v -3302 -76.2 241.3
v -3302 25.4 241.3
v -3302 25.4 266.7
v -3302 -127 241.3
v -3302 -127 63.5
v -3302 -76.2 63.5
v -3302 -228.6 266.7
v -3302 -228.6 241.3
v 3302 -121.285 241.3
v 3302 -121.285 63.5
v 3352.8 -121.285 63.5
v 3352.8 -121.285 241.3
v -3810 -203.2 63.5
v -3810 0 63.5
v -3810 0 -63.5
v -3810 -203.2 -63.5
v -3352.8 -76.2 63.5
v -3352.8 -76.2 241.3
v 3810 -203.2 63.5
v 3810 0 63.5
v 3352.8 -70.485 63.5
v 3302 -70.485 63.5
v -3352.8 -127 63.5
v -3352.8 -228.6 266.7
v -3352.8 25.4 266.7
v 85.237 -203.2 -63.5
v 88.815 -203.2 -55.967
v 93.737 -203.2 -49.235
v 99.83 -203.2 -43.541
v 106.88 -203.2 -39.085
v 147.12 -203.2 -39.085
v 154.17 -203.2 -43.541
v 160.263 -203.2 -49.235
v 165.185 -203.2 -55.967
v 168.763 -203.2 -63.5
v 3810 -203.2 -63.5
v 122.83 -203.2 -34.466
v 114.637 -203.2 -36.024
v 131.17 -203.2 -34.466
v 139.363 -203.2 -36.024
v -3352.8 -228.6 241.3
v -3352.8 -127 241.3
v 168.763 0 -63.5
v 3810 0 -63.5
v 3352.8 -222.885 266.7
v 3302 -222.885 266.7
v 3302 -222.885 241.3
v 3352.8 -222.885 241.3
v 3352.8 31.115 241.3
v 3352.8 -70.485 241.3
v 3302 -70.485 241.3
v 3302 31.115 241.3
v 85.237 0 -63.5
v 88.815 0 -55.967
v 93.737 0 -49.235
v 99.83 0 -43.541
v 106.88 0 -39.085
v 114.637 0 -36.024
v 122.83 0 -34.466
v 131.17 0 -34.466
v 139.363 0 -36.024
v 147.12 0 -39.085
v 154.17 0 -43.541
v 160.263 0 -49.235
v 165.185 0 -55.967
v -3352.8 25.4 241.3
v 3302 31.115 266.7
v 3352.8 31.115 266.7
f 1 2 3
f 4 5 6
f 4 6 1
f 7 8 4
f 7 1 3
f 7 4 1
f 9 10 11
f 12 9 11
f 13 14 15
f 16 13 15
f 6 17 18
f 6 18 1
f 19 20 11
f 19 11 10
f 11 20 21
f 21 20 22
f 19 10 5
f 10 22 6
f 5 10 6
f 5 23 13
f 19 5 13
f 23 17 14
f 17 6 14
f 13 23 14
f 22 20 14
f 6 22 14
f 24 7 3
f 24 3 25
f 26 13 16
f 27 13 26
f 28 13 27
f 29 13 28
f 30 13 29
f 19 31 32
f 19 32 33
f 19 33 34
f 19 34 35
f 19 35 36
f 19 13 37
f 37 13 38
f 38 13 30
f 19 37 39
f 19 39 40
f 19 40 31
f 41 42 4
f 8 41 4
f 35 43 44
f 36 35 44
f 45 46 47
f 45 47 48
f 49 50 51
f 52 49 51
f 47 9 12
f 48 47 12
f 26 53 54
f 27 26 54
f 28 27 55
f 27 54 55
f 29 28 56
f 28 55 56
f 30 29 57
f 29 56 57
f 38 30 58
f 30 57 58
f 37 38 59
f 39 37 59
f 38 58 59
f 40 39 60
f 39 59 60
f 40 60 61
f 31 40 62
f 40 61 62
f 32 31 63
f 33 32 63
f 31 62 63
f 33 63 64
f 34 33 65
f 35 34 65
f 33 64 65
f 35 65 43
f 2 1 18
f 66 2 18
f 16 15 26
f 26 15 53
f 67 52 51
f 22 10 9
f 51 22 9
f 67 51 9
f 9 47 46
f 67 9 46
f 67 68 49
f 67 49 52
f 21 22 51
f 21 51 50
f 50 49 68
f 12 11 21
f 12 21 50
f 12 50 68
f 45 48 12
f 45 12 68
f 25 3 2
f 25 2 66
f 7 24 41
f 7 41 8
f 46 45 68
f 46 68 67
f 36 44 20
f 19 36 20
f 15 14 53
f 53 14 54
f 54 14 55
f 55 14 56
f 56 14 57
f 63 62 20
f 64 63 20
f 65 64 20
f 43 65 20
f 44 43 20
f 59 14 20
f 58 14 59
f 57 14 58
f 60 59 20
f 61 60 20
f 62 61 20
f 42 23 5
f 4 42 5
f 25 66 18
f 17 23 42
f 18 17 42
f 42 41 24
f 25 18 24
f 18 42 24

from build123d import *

# Parameters (mm, degrees)
F1_DEPTH  = 203.2
F2_W      = 50.8
F2_H      = 50.8
F3_DEPTH  = 203.2
F4_W      = 50.8
F4_H      = 25.4
F5_DEPTH  = 101.6
F6_W      = 50.8
F6_H      = 25.4
F7_DEPTH  = 101.6
F8_W      = 50.8
F8_H      = 25.4
F9_DEPTH  = 101.6
F10_W     = 50.8
F10_H     = 25.4
F11_DEPTH = 101.6


with BuildPart() as f1:
    # F0 (on Front) → F1 (new body)
    with BuildSketch(Plane.XZ):
        with BuildLine():
            Line((3810, -63.5), (3810, 63.5))
            Line((3810, 63.5), (-3810, 63.5))
            Line((-3810, 63.5), (-3810, -63.5))
            Line((-3810, -63.5), (85.237012, -63.5))
            ThreePointArc((85.237012, -63.5), (127, -34.270229), (168.762988, -63.5))
            Line((168.762988, -63.5), (420.722027, -63.5))
            Line((420.722027, -63.5), (493.677973, -63.5))
            Line((493.677973, -63.5), (3810, -63.5))
        make_face()
    extrude(amount=F1_DEPTH)

    # F2 (on face) → F3 (join)
    with BuildSketch(Plane.XY.offset(63.5)):
        with Locations((3327.4, -95.884992)):
            Rectangle(F2_W, F2_H)
        with Locations((-3327.4, -101.6)):
            Rectangle(F2_W, F2_H)
    extrude(amount=F3_DEPTH)

    # F4 (on face) → F5 (join)
    with BuildSketch(Plane.XZ.offset(121.284992)):
        with Locations((3327.4, 254)):
            Rectangle(F4_W, F4_H)
    extrude(amount=F5_DEPTH)

    # F6 (on face) → F7 (join)
    with BuildSketch(Plane(origin=(0, -70.484992, 0), x_dir=(-1, 0, 0), z_dir=(0, 1, 0))):
        with Locations((-3327.4, 254)):
            Rectangle(F6_W, F6_H)
    extrude(amount=F7_DEPTH)

    # F8 (on face) → F9 (join)
    with BuildSketch(Plane.XZ.offset(127)):
        with Locations((-3327.4, 254)):
            Rectangle(F8_W, F8_H)
    extrude(amount=F9_DEPTH)

    # F10 (on face) → F11 (join)
    with BuildSketch(Plane(origin=(0, -76.2, 0), x_dir=(-1, 0, 0), z_dir=(0, 1, 0))):
        with Locations((3327.4, 254)):
            Rectangle(F10_W, F10_H)
    extrude(amount=F11_DEPTH)


solid = f1.part
